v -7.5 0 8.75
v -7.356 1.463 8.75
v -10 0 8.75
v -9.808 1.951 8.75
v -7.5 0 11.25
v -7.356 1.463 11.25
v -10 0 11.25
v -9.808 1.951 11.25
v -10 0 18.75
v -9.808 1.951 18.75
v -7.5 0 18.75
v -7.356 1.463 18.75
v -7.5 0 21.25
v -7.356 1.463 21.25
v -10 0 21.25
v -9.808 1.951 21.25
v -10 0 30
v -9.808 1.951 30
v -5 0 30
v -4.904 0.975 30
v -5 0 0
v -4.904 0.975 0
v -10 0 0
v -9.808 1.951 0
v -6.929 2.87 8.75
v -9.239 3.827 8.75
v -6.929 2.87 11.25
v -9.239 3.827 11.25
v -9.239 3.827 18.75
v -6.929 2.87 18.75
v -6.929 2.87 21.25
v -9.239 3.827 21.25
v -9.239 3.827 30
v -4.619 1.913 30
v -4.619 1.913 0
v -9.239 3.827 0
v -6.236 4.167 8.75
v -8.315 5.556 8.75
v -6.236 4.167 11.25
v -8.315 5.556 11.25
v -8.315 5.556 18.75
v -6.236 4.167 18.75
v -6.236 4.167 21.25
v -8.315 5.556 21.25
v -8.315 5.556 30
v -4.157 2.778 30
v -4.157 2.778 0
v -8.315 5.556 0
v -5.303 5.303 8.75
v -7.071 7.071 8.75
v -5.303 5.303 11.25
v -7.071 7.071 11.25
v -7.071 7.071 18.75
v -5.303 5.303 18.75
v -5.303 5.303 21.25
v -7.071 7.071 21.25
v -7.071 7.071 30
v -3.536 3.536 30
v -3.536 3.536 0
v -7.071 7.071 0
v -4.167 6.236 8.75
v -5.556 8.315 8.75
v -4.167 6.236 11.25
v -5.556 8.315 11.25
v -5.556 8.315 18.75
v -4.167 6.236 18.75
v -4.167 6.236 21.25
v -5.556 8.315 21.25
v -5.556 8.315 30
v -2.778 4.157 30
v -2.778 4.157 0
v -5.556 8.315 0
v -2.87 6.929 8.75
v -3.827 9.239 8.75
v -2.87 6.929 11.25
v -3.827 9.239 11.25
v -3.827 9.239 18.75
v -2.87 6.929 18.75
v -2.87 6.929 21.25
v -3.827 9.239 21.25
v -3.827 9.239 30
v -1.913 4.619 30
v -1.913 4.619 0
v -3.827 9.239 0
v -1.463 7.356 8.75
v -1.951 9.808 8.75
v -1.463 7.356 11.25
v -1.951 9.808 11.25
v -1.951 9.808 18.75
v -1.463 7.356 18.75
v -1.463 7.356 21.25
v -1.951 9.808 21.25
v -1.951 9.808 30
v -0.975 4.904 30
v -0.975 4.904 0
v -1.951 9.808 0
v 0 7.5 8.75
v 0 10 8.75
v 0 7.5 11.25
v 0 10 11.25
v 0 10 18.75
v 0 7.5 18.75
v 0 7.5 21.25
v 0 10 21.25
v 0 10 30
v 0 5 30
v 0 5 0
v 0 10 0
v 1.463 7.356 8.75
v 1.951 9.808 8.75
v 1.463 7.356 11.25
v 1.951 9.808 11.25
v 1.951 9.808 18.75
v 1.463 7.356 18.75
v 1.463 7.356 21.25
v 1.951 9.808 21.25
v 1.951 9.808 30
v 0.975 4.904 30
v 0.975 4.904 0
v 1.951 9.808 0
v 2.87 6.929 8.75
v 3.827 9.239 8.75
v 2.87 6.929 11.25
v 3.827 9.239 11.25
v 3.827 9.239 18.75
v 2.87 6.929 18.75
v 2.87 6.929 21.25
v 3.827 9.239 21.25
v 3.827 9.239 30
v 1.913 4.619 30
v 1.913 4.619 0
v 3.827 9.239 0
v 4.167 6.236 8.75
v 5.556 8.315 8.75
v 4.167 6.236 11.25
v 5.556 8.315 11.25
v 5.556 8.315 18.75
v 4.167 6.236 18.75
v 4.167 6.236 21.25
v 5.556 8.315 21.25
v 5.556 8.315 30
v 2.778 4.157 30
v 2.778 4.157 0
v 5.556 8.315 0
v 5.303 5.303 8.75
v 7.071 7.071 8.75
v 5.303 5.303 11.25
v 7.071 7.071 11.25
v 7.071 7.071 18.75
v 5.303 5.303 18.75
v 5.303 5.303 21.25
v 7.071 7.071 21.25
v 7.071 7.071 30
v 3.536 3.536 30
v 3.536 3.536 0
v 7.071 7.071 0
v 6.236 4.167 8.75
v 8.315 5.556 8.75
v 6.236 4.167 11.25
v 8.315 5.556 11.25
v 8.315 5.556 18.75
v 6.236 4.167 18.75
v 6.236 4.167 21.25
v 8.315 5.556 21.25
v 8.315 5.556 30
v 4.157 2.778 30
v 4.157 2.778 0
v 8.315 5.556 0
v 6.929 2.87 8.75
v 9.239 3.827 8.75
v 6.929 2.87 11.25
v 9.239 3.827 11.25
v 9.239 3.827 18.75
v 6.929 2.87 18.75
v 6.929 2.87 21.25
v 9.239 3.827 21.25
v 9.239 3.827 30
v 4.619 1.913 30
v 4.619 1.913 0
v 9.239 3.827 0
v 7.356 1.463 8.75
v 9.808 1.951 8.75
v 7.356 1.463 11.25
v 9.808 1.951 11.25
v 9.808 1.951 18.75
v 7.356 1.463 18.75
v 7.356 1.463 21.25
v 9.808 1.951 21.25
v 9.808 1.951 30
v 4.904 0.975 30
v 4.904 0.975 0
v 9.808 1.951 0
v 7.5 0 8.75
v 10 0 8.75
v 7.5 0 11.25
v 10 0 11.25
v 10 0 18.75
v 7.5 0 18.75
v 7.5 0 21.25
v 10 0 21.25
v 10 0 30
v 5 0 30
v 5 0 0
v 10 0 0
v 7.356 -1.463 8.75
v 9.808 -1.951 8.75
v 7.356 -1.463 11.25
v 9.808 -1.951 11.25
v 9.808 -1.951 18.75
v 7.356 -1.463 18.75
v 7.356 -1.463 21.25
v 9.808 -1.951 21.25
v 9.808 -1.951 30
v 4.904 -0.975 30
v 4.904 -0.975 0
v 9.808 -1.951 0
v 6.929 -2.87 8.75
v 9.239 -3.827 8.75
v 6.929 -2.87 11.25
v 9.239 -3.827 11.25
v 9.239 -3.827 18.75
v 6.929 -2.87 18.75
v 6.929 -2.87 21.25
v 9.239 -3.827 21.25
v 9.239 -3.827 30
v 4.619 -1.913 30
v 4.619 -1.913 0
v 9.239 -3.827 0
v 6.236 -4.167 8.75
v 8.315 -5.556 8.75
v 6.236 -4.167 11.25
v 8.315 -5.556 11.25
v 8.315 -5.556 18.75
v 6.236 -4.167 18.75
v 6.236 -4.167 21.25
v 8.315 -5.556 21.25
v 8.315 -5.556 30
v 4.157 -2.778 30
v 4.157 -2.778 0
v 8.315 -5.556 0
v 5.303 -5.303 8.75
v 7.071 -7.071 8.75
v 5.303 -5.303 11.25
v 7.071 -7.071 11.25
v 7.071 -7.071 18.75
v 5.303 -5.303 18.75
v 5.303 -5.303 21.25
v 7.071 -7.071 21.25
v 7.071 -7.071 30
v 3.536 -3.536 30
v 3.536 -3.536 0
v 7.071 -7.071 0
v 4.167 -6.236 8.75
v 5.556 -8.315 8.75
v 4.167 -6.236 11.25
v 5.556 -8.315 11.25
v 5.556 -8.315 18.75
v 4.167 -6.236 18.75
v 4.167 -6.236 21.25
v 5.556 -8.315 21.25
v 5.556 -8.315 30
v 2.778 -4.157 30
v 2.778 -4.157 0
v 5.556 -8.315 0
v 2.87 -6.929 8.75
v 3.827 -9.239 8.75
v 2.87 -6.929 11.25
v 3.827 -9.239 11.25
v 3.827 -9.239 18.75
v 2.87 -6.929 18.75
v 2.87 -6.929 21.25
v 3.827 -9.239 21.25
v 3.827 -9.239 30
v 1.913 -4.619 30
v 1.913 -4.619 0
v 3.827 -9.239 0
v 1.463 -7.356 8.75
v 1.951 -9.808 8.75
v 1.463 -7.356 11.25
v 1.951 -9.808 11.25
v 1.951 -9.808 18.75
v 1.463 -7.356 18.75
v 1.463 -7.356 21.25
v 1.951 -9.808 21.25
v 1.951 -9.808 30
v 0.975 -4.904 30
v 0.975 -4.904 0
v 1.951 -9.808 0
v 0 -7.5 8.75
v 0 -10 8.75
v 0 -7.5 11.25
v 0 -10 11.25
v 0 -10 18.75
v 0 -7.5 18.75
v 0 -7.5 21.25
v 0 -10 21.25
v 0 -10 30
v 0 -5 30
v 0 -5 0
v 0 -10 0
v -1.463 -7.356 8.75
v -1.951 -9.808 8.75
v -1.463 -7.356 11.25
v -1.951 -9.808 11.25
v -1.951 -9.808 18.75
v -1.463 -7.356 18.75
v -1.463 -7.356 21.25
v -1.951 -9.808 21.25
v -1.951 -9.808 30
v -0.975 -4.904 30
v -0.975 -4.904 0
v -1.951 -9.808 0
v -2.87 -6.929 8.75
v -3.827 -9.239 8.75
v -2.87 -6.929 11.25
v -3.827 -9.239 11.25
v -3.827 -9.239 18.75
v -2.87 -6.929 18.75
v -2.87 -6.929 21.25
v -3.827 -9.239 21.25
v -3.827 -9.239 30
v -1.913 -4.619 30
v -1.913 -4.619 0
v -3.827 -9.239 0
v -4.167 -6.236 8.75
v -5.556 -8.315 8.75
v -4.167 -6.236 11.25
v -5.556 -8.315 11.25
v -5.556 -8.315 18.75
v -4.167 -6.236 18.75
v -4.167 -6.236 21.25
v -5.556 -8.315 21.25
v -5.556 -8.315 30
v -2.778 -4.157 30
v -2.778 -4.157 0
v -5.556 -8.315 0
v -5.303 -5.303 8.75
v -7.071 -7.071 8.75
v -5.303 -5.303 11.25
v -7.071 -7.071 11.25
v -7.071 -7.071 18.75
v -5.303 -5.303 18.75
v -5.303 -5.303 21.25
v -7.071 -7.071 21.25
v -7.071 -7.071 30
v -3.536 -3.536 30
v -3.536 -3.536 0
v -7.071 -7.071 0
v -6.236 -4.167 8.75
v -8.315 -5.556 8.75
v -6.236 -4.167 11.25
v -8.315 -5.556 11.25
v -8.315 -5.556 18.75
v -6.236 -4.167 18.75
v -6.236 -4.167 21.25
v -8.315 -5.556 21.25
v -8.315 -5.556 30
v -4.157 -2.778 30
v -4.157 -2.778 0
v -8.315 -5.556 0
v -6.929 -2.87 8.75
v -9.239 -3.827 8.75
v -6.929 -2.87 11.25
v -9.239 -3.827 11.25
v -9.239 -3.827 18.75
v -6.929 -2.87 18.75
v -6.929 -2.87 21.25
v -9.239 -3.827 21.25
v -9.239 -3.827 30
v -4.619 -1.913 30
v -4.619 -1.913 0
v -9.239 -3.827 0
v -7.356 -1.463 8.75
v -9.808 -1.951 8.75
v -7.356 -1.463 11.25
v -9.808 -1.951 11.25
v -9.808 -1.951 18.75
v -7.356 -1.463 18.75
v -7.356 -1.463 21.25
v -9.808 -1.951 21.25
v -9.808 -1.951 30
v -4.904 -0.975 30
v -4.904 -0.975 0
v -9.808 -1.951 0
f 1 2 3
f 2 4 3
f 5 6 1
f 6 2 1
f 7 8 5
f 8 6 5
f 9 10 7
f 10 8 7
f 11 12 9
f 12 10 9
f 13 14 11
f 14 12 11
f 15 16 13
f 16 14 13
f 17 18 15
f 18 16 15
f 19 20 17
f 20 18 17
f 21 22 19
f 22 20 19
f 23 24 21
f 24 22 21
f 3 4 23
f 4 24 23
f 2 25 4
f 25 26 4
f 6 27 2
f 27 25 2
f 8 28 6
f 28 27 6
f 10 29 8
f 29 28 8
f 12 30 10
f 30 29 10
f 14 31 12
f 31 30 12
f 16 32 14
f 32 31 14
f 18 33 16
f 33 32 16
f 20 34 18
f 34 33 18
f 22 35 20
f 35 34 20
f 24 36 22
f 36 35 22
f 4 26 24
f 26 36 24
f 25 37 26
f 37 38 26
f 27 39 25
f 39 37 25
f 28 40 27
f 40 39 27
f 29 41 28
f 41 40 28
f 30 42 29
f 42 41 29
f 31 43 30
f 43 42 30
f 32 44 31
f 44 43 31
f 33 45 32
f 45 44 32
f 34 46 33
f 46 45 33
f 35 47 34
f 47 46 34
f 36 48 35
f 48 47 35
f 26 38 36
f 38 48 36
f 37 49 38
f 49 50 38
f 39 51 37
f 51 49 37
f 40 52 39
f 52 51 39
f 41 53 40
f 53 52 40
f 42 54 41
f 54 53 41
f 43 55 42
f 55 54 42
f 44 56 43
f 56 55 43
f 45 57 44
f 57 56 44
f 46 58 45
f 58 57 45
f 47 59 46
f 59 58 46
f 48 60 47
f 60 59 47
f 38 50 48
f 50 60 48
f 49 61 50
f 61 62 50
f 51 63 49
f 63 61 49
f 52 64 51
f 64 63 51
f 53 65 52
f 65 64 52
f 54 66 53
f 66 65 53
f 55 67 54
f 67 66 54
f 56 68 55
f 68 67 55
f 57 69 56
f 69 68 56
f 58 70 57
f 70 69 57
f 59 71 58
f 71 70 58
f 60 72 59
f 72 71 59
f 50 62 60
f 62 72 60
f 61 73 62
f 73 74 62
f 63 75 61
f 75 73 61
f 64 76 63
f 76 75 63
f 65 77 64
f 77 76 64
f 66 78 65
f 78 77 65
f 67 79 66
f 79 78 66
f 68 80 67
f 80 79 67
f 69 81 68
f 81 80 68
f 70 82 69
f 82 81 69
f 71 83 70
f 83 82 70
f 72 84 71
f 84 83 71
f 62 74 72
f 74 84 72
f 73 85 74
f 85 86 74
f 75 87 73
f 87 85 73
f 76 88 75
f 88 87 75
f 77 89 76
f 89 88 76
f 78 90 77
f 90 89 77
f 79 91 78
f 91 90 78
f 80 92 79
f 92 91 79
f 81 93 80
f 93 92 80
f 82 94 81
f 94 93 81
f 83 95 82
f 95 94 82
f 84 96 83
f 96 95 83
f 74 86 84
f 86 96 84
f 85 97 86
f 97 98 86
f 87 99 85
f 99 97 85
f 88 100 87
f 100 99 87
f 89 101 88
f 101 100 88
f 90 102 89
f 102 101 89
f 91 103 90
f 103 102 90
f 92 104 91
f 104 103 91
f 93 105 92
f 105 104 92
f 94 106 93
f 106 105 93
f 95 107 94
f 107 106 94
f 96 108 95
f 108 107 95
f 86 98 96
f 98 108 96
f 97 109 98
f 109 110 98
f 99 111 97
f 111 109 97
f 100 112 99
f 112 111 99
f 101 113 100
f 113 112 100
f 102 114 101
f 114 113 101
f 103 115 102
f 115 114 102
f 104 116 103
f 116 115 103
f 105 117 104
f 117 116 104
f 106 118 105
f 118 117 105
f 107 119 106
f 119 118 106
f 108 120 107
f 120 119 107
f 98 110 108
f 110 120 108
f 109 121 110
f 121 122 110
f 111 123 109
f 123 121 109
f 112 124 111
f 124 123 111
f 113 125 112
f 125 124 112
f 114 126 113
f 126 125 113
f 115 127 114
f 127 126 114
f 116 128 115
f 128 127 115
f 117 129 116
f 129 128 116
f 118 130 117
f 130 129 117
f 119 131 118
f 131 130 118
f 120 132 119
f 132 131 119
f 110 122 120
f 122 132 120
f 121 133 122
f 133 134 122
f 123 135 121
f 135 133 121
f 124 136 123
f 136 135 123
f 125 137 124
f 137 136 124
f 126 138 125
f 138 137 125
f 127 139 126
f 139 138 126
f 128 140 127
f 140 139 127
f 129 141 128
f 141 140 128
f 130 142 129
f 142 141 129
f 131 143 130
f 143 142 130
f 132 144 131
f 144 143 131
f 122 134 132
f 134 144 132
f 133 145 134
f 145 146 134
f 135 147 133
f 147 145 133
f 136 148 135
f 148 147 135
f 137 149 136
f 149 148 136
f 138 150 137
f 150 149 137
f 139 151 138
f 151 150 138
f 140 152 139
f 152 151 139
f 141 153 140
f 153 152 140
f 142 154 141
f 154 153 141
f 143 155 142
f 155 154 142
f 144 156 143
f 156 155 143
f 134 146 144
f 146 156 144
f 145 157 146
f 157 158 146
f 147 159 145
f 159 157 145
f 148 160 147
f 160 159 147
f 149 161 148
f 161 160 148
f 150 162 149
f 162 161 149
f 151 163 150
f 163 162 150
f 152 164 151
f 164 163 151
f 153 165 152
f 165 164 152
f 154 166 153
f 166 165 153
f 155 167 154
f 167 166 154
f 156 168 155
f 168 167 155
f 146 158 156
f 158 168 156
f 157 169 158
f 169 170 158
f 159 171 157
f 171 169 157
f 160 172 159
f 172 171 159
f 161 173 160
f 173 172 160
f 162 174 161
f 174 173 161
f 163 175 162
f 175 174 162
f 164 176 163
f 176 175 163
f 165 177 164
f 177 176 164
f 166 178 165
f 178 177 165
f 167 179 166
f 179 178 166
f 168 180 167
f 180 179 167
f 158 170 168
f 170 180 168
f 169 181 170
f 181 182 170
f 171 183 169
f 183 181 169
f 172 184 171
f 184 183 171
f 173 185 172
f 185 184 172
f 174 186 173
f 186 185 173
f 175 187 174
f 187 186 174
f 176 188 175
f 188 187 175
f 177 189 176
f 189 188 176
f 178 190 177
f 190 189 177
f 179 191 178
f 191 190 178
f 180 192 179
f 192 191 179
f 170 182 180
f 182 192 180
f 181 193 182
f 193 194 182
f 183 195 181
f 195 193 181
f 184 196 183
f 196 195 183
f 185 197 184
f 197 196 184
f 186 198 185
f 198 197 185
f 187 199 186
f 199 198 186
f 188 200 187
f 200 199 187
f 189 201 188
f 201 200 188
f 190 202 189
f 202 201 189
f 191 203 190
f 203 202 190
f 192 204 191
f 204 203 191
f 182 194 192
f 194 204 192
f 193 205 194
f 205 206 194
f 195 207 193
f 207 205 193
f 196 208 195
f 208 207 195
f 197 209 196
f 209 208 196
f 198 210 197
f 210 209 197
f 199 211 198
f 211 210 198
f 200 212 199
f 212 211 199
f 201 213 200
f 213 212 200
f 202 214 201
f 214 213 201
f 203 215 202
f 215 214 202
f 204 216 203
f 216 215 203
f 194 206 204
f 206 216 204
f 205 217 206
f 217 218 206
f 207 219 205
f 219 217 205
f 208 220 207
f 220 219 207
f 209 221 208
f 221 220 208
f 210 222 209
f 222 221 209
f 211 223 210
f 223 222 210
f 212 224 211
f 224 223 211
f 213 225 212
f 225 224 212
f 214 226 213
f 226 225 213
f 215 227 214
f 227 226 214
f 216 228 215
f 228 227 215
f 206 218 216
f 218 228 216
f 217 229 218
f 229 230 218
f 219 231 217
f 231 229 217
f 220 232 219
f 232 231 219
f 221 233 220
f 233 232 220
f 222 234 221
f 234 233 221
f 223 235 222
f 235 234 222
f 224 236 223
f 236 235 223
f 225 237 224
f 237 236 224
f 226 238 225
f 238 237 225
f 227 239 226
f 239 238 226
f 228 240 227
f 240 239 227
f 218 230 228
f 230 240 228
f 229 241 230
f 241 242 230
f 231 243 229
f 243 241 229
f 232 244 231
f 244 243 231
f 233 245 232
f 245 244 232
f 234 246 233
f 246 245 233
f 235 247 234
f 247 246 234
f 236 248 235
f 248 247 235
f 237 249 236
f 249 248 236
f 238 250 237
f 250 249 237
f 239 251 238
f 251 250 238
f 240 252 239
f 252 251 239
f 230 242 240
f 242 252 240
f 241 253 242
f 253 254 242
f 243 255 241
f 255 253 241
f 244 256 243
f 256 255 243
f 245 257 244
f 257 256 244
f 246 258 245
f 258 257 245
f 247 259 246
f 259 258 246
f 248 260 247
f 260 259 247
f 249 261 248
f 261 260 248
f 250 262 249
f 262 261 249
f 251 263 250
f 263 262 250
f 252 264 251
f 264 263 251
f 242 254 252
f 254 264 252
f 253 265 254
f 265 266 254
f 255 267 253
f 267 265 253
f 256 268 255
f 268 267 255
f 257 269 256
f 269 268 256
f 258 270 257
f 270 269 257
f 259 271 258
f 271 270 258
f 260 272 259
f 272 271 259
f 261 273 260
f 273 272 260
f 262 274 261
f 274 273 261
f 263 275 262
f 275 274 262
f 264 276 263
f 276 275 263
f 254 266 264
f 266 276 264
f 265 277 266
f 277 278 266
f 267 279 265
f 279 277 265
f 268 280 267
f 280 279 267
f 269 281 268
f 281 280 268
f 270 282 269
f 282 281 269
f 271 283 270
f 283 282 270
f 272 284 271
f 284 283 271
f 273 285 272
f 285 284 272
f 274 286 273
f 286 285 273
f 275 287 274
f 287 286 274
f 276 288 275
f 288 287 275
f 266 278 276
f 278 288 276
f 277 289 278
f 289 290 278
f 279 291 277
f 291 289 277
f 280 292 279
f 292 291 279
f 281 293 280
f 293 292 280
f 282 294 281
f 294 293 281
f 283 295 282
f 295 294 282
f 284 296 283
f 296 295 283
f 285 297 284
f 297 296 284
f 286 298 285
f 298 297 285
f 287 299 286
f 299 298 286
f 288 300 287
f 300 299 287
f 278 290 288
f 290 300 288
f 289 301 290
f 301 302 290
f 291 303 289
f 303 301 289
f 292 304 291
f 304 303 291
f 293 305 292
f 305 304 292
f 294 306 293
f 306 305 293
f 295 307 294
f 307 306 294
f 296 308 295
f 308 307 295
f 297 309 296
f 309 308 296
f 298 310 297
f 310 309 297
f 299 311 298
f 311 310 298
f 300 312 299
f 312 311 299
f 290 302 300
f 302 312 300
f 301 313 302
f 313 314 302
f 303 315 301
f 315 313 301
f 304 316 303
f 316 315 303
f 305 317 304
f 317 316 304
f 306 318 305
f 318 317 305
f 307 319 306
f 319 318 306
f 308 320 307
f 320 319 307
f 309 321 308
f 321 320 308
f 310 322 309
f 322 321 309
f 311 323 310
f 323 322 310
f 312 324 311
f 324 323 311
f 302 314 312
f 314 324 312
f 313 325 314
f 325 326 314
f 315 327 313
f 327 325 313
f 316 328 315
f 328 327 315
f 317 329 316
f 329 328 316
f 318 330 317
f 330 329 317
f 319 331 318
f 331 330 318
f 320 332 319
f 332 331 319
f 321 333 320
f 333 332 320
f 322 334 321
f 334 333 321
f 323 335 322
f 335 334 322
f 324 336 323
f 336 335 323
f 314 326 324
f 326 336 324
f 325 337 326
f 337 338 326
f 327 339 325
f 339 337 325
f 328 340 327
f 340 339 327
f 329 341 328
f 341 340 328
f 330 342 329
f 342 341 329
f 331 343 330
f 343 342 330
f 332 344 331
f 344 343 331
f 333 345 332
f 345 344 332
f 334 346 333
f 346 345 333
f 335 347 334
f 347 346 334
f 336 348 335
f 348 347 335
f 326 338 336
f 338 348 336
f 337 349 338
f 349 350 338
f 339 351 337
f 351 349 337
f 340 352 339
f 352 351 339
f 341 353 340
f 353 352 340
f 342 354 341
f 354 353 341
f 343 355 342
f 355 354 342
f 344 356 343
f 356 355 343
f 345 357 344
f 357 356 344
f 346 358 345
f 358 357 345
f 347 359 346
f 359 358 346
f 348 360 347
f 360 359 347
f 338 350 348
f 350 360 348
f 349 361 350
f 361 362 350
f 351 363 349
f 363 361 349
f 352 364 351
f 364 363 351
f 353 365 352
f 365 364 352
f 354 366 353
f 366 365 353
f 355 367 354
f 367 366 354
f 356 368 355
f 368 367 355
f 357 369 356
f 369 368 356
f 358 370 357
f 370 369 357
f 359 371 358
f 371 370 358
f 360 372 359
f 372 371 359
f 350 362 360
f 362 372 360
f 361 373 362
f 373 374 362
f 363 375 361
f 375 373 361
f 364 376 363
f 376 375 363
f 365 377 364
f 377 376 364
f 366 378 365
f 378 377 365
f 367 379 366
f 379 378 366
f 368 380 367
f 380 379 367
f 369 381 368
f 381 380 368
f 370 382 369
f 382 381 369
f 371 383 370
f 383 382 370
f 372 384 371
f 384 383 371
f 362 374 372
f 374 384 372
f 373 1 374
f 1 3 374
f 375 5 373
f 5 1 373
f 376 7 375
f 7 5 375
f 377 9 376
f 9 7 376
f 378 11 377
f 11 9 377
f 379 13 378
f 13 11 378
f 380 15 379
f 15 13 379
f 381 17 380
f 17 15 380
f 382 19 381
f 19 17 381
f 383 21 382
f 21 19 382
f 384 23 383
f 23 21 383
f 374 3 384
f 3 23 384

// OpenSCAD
$fn = 32;

// ----------------------------------------------------------------------
// Grooved revolve: plain_grooves, bore R5
// ----------------------------------------------------------------------

// --- parameters (mm) ---
bore_r = 5;               // bore radius
outer_r = 10;             // outer radius of the body
total_h = 30;             // overall height, Z
wall = 5;                 // radial wall thickness
groove_w = 2.5;           // groove width
groove_d = 2.5;           // groove depth
grooves = 2;              // number of outer grooves

bbox_x = 2 * outer_r;  // full diameter
bore_d = 2 * bore_r;  // bore diameter
body_d = 2 * outer_r;  // body diameter
revolve_angle = 360;  // full turn around the Z axis

profile = [[5, 0], [10, 0], [10, 8.75], [7.5, 8.75], [7.5, 11.25], [10, 11.25], [10, 18.75], [7.5, 18.75], [7.5, 21.25], [10, 21.25], [10, 30], [5, 30]];  // primary outline, 12 points, counter clockwise

// --- the one profile operation ---
rotate_extrude(angle = revolve_angle) polygon(points = profile);
